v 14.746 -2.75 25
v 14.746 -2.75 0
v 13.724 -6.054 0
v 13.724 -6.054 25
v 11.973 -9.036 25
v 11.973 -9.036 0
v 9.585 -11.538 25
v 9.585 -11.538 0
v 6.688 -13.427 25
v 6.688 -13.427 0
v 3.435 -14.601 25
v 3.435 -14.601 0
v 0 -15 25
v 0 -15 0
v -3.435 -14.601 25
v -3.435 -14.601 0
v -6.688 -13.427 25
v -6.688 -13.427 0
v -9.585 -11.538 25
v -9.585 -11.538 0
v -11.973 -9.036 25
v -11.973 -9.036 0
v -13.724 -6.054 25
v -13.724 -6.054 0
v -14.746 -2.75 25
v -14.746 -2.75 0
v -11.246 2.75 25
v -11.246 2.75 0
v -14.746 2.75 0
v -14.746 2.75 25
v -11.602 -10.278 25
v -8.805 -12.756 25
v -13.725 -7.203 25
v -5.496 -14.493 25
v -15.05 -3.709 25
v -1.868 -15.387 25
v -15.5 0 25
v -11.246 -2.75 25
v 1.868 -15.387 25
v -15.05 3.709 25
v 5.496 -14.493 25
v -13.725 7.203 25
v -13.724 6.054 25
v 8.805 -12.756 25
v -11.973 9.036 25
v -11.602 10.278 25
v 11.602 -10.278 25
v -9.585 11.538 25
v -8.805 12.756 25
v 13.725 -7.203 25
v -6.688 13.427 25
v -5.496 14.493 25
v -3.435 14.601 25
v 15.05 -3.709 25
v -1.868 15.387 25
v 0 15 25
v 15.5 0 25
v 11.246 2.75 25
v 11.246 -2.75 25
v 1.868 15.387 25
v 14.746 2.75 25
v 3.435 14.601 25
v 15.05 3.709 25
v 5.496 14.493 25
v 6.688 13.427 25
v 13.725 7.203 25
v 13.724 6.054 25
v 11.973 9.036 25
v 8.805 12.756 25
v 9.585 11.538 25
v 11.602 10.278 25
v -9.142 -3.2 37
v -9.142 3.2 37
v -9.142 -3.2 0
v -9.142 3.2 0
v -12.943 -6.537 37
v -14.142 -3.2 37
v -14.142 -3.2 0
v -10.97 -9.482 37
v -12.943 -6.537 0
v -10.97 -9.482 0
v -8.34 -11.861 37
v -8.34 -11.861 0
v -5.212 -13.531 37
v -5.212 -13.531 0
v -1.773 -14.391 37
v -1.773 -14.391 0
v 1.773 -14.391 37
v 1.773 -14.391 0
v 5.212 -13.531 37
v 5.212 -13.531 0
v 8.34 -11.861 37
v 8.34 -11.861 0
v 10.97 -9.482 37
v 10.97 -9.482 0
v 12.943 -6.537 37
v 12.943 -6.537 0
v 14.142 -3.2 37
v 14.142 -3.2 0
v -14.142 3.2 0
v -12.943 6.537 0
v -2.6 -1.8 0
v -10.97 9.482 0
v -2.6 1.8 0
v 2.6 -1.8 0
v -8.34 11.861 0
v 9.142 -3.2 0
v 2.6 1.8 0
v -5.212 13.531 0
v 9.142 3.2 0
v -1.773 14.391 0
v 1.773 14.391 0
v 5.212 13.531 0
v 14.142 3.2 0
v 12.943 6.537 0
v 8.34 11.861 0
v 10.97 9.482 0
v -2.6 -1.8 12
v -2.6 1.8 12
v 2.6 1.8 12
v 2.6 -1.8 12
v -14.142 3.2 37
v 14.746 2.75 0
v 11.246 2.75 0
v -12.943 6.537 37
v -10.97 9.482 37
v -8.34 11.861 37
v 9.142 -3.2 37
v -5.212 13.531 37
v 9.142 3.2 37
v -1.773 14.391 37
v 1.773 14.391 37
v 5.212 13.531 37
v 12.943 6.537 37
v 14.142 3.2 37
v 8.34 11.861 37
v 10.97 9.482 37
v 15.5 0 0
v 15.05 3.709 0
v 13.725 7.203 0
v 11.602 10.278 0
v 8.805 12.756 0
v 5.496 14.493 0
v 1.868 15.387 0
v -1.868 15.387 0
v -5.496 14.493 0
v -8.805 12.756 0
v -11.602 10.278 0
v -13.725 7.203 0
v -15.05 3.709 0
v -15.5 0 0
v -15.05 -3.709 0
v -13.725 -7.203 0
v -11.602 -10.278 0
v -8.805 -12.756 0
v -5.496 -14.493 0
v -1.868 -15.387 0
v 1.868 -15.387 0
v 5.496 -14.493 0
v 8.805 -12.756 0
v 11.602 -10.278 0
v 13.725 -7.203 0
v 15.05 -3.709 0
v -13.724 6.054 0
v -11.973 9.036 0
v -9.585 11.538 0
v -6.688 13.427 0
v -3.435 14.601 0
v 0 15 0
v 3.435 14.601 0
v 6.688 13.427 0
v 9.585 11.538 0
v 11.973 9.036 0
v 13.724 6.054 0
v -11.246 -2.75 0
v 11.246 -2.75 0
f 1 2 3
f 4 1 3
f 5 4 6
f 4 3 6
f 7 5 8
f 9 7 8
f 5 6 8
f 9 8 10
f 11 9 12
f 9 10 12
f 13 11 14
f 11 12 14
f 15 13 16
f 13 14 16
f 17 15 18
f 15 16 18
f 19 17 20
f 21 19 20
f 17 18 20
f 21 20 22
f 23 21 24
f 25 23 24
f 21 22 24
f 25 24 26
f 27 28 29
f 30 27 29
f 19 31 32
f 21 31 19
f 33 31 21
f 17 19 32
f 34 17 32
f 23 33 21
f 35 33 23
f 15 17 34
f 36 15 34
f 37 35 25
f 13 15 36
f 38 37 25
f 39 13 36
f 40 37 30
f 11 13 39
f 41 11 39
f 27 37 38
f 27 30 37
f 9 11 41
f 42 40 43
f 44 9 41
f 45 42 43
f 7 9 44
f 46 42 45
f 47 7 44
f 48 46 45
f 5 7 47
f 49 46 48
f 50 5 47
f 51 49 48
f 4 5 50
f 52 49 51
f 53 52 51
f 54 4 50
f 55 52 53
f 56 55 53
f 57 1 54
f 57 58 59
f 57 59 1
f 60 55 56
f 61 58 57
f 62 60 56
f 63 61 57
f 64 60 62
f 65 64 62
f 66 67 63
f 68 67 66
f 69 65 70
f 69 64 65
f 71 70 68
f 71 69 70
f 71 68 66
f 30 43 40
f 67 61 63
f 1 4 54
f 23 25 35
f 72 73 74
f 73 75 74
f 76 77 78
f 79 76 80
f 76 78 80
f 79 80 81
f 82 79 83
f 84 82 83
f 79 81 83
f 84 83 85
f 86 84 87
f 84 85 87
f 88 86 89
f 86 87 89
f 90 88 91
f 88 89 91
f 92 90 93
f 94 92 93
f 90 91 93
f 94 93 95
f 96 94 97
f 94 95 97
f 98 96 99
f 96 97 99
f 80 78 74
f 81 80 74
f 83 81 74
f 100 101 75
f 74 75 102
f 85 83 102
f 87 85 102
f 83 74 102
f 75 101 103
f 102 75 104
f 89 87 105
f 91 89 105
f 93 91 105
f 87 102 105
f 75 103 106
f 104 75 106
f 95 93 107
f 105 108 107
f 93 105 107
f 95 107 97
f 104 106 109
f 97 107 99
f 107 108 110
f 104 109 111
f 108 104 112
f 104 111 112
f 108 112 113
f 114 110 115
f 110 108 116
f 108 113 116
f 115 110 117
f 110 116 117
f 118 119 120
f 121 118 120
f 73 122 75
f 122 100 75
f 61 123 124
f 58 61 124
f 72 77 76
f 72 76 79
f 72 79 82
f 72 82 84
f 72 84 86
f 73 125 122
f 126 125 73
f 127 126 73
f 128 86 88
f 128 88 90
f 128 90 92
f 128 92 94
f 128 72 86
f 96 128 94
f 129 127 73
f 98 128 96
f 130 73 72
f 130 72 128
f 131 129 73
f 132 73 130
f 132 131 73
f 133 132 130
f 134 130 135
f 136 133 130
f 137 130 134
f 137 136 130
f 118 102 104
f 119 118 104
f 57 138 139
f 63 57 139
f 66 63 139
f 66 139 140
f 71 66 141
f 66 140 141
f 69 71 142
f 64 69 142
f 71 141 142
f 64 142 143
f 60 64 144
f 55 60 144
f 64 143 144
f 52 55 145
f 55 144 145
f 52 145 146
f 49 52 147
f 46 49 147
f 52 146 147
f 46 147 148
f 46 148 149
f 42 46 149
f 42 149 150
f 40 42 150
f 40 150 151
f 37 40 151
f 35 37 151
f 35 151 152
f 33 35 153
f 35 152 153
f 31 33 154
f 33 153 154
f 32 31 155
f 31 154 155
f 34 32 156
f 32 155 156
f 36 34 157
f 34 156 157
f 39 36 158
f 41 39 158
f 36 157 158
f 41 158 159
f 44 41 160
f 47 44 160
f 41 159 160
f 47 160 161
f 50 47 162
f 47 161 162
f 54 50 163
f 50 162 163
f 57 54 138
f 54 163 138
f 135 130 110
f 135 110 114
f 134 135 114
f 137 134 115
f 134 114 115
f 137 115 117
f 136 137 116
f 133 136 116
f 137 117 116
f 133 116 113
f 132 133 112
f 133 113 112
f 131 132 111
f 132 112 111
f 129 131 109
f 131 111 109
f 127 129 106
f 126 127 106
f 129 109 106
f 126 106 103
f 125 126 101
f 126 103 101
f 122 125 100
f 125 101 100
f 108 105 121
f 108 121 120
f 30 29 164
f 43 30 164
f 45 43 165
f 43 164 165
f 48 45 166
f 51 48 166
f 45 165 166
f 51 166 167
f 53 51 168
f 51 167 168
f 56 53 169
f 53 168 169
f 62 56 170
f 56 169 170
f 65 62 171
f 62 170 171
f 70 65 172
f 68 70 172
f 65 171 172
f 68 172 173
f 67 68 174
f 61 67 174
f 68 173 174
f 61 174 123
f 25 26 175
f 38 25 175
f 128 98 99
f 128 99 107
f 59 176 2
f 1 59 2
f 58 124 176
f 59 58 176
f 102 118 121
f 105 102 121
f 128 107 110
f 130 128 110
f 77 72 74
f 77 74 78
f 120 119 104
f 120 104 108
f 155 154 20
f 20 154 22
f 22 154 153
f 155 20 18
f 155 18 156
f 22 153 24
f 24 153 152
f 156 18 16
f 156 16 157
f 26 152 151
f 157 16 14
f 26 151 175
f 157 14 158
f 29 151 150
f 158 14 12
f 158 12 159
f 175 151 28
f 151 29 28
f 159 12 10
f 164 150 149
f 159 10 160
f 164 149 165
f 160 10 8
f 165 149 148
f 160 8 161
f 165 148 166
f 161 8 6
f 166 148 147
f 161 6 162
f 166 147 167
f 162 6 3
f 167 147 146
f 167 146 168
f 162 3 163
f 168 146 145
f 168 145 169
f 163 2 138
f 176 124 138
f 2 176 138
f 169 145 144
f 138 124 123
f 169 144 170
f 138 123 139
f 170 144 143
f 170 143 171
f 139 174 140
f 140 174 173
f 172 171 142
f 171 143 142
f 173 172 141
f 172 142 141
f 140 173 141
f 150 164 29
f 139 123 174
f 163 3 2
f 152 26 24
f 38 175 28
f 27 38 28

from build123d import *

# Parameters (mm, degrees)
F0_R     = 15.5
F1_DEPTH = 25
F2_W     = 5.2
F2_H     = 3.6
F3_DEPTH = 12
F4_W     = 5.2
F4_H     = 3.6
F5_DEPTH = 25


with BuildPart() as f1:
    # F0 (on Top) → F1 (new body)
    with BuildSketch(Plane.XY):
        Circle(F0_R)
        with BuildLine():
            ThreePointArc((14.7457621031, 2.75), (14.9363052919, 1.3808635802), (15, 0))
            ThreePointArc((15, 0), (14.9363052919, -1.3808635802), (14.7457621031, -2.75))
            ThreePointArc((14.7457621031, -2.75), (0, -15), (-14.7457621031, -2.75))
            ThreePointArc((-14.7457621031, -2.75), (-15, 0), (-14.7457621031, 2.75))
            ThreePointArc((-14.7457621031, 2.75), (0, 15), (14.7457621031, 2.75))
        make_face(mode=Mode.SUBTRACT)
        with BuildLine():
            Line((-11.2457621031, 2.75), (-14.7457621031, 2.75))
            ThreePointArc((-14.7457621031, 2.75), (-15, 0), (-14.7457621031, -2.75))
            Line((-14.7457621031, -2.75), (-11.2457621031, -2.75))
            Line((-11.2457621031, -2.75), (-11.2457621031, 0))
            Line((-11.2457621031, 0), (-11.2457621031, 2.75))
        make_face()
        with BuildLine():
            ThreePointArc((14.7457621031, -2.75), (14.9363052919, -1.3808635802), (15, 0))
            ThreePointArc((15, 0), (14.9363052919, 1.3808635802), (14.7457621031, 2.75))
            Line((14.7457621031, 2.75), (11.2457621031, 2.75))
            Line((11.2457621031, 2.75), (11.2457621031, 0))
            Line((11.2457621031, 0), (11.2457621031, -2.75))
            Line((11.2457621031, -2.75), (14.7457621031, -2.75))
        make_face()
    extrude(amount=F1_DEPTH)


with BuildPart() as f3:
    # F2 (on Top) → F3 (new body)
    with BuildSketch(Plane.XY):
        with BuildLine():
            Line((9.1424891727, 3.2), (14.1424891727, 3.2))
            ThreePointArc((14.1424891727, 3.2), (0, 14.5), (-14.1424891727, 3.2))
            Line((-14.1424891727, 3.2), (-9.1424891727, 3.2))
            Line((-9.1424891727, 3.2), (-9.1424891727, 0))
            Line((-9.1424891727, 0), (-9.1424891727, -3.2))
            Line((-9.1424891727, -3.2), (-14.1424891727, -3.2))
            ThreePointArc((-14.1424891727, -3.2), (0, -14.5), (14.1424891727, -3.2))
            Line((14.1424891727, -3.2), (9.1424891727, -3.2))
            Line((9.1424891727, -3.2), (9.1424891727, 0))
            Line((9.1424891727, 0), (9.1424891727, 3.2))
        make_face()
        Rectangle(F2_W, F2_H, mode=Mode.SUBTRACT)
    extrude(amount=F3_DEPTH)

    # F4 (on face) → F5 (join)
    with BuildSketch(Plane.XY.offset(12)):
        with BuildLine():
            Line((9.1424891727, 3.2), (14.1424891727, 3.2))
            ThreePointArc((14.1424891727, 3.2), (0, 14.5), (-14.1424891727, 3.2))
            Line((-14.1424891727, 3.2), (-9.1424891727, 3.2))
            Line((-9.1424891727, 3.2), (-9.1424891727, -3.2))
            Line((-9.1424891727, -3.2), (-14.1424891727, -3.2))
            ThreePointArc((-14.1424891727, -3.2), (0, -14.5), (14.1424891727, -3.2))
            Line((14.1424891727, -3.2), (9.1424891727, -3.2))
            Line((9.1424891727, -3.2), (9.1424891727, 3.2))
        make_face()
        Rectangle(F4_W, F4_H, mode=Mode.SUBTRACT)
        Rectangle(F4_W, F4_H)
    extrude(amount=F5_DEPTH)


solid = Compound([f1.part, f3.part])
